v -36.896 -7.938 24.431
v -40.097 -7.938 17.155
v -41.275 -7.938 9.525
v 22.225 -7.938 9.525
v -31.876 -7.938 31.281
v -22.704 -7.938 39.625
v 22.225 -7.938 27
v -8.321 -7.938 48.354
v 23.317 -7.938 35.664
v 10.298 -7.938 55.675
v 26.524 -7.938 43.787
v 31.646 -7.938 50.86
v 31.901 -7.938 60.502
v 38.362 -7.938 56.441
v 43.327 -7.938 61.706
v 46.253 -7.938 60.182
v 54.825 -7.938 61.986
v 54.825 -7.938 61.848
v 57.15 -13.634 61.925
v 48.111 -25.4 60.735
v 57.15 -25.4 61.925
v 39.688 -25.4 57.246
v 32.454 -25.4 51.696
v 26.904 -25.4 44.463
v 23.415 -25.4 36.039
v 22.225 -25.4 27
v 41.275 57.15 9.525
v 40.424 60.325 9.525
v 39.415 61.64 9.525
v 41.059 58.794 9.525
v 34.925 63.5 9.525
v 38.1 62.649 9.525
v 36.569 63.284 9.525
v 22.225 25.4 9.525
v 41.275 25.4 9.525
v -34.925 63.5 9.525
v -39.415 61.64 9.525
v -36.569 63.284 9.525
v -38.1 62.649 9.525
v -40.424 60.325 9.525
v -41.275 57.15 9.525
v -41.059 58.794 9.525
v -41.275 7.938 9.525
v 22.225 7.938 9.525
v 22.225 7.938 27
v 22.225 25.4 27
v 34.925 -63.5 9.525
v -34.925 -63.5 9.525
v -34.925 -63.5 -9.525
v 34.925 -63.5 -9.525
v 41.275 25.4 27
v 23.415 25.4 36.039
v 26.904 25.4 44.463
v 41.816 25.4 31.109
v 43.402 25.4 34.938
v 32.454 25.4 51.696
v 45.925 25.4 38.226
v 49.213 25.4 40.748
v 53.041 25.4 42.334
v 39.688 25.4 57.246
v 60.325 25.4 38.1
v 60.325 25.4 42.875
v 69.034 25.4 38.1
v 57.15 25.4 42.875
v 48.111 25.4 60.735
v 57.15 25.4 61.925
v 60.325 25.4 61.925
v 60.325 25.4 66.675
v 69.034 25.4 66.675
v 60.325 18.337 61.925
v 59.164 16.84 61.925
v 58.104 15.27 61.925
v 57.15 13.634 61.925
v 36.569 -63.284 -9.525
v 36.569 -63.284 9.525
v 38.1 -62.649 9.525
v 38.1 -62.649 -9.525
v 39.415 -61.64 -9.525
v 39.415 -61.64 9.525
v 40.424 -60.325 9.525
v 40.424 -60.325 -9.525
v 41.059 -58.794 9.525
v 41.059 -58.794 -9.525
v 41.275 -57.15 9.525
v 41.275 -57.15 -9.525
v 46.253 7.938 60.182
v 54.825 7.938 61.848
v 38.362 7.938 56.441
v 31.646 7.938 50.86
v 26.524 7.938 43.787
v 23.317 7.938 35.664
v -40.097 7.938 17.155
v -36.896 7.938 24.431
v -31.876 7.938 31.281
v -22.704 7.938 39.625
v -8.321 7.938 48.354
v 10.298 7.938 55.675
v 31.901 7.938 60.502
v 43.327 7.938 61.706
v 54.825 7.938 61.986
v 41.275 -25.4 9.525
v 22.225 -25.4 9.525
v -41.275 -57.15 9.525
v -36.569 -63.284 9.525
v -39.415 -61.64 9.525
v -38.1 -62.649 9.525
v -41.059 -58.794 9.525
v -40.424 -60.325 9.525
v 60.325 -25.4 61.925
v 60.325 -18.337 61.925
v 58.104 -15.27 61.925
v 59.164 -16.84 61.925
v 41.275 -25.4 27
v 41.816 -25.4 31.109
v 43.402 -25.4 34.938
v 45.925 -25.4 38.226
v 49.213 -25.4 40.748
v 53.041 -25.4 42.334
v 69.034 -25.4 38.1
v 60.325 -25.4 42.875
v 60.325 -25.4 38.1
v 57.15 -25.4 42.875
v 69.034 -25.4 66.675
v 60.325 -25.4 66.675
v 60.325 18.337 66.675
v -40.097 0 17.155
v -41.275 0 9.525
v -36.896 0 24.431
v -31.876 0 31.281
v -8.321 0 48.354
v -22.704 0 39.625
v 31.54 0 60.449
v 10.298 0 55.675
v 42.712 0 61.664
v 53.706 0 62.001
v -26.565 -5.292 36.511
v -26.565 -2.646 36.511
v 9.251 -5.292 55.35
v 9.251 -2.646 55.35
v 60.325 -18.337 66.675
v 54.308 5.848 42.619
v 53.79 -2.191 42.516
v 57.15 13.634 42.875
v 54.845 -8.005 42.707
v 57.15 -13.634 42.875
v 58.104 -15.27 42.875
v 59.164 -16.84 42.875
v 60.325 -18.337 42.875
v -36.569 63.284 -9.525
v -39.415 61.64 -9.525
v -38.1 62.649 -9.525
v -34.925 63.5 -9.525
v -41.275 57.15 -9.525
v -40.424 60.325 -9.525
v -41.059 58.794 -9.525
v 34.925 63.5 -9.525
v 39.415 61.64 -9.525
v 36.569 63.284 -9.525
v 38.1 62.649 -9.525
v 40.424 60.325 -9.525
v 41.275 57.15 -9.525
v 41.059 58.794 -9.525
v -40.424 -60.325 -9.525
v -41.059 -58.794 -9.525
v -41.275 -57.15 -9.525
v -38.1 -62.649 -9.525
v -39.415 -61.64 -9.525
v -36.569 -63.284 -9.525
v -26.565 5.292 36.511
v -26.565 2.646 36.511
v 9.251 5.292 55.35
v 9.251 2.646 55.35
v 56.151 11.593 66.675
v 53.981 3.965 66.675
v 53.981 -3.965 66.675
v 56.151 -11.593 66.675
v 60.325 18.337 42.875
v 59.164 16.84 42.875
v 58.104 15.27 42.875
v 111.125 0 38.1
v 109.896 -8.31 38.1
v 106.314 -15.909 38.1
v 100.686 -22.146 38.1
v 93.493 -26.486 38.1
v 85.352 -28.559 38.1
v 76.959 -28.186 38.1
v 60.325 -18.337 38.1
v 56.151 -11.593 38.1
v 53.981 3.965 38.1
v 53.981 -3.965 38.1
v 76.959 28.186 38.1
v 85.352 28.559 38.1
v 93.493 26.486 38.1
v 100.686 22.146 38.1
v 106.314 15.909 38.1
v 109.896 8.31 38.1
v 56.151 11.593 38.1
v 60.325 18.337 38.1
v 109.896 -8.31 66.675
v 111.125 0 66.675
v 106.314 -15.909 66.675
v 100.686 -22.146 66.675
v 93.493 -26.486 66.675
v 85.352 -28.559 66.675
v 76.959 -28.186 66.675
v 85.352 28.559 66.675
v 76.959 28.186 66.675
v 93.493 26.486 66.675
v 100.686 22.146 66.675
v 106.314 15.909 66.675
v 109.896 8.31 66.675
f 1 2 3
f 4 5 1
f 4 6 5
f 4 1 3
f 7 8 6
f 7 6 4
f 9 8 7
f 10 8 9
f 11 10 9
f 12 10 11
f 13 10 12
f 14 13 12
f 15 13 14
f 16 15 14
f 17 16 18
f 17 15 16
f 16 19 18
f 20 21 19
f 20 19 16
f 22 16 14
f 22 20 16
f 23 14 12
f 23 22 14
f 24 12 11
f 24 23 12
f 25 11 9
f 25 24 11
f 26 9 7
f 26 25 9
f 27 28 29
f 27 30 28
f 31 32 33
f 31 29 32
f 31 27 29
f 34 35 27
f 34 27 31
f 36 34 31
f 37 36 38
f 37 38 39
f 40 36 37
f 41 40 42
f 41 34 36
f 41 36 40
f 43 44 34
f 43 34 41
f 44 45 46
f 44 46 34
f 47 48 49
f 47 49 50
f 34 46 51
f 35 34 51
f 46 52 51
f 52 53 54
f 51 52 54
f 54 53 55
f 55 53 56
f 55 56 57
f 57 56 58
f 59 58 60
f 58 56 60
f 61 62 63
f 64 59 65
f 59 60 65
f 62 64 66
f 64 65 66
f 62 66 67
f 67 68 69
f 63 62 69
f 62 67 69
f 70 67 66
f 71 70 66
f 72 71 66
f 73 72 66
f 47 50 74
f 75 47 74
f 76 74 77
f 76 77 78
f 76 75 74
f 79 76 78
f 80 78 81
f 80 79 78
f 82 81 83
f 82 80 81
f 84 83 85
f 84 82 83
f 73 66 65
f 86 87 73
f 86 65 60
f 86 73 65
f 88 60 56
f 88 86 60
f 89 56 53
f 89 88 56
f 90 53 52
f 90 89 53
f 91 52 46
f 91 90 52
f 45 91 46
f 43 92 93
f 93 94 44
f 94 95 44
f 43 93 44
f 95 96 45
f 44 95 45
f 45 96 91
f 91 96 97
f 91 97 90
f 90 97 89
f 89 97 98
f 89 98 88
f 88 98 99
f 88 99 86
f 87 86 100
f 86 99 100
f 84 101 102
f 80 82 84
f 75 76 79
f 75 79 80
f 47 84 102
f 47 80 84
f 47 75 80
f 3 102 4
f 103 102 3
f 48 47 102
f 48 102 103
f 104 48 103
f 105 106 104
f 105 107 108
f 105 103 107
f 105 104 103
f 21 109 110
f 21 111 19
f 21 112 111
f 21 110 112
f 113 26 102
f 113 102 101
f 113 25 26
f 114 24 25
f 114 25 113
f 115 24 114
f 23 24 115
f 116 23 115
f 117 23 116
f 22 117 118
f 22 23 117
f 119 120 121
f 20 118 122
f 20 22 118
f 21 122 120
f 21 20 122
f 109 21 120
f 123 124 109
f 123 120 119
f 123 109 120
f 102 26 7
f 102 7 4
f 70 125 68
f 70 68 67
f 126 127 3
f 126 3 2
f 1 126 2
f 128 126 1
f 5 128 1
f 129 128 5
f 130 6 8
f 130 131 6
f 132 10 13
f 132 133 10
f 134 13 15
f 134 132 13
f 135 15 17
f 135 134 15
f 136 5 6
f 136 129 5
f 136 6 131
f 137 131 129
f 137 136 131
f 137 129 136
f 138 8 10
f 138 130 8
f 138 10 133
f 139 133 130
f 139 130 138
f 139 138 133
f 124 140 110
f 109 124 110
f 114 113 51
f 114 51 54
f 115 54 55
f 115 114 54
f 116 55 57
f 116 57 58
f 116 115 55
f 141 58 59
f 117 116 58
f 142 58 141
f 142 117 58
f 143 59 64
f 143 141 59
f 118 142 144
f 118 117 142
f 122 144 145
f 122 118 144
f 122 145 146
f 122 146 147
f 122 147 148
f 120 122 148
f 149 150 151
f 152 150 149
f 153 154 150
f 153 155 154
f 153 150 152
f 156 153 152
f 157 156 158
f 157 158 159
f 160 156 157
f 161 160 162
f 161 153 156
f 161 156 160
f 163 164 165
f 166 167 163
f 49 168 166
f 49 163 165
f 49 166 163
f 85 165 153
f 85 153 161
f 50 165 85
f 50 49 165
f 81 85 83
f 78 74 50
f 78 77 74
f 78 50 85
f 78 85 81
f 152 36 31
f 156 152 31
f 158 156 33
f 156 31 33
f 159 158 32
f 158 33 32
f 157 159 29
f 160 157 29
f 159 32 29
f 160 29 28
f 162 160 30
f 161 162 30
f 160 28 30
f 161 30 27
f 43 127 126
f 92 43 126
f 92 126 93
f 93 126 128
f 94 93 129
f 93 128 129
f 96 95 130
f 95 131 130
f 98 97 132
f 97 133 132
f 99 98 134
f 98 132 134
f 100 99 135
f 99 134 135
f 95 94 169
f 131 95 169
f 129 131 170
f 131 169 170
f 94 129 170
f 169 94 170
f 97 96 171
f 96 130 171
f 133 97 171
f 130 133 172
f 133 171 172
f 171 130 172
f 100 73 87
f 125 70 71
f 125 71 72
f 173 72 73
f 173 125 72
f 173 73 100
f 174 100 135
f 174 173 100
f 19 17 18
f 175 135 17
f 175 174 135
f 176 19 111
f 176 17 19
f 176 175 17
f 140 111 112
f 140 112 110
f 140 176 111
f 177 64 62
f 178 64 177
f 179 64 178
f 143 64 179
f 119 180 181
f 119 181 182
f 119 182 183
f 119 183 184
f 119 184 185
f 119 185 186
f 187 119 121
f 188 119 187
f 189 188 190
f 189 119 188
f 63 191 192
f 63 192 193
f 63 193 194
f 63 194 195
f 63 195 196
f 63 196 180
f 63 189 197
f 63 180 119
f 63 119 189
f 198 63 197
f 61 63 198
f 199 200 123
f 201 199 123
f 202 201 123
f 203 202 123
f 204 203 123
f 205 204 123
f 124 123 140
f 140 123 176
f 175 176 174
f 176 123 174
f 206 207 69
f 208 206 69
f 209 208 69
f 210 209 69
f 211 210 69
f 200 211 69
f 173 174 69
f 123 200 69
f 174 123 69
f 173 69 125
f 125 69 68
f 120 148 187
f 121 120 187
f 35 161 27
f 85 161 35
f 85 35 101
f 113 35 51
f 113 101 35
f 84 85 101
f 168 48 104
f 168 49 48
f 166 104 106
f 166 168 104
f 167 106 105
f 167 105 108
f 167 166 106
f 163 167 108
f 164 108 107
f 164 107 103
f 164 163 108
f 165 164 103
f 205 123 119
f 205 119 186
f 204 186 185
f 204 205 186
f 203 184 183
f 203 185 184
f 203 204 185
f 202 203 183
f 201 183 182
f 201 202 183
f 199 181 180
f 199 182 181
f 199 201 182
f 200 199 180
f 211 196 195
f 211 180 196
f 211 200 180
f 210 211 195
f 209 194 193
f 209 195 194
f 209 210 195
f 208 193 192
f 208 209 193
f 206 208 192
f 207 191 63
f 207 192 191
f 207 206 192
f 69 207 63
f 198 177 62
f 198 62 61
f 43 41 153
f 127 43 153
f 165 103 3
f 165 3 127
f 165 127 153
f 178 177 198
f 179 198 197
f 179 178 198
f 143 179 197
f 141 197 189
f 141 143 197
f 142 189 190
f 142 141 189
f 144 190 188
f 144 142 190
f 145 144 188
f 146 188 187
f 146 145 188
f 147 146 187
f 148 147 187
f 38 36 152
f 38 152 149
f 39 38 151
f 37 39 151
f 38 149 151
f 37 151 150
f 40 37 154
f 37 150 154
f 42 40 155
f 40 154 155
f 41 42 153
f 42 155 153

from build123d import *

# Parameters (mm, degrees)
F1_DEPTH = 63.5
F2_DEPTH = 25.4
F3_DEPTH = 7.9375
F0_W     = 28.7093819976
F0_H     = 28.575
F5_R     = 6.35


with BuildPart() as f1:
    # F0 (on Front) → F1 (new body, symmetric)
    with BuildSketch(Plane.XZ):
        Polygon((41.275, -9.525), (41.275, 9.525), (22.225, 9.525), (-41.275, 9.525), (-41.275, -9.525), align=None)
    extrude(amount=F1_DEPTH, both=True)

    # F0 (on Front) → F2 (join, symmetric)
    with BuildSketch(Plane.XZ):
        with BuildLine():
            Line((22.225, 9.525), (41.275, 9.525))
            Line((41.275, 9.525), (41.275, 27.0002))
            ThreePointArc((41.275, 27.0002), (45.9246798487, 38.2255201513), (57.15, 42.8752))
            Line((57.15, 42.8752), (60.325, 42.8752))
            Line((60.325, 42.8752), (60.325, 61.9252))
            Line((60.325, 61.9252), (57.15, 61.9252))
            ThreePointArc((57.15, 61.9252), (32.4542956671, 51.6959043329), (22.225, 27.0002))
            Line((22.225, 27.0002), (22.225, 9.525))
        make_face()
        Polygon((60.325, 61.9252), (60.325, 42.8752), (60.325, 38.1), (82.4156180024, 38.1), (82.4156180024, 66.675), (60.325, 66.675), align=None)
    extrude(amount=F2_DEPTH, both=True)

    # F0 (on Front) → F3 (join, symmetric)
    with BuildSketch(Plane.XZ):
        with BuildLine():
            Line((-41.275, 9.525), (22.225, 9.525))
            Line((22.225, 9.525), (22.225, 27.0002))
            ThreePointArc((22.225, 27.0002), (32.4542956671, 51.6959043329), (57.15, 61.9252))
            add(Edge.make_bspline(
                [(-41.275, 9.525), (-40.8948995173, 39.7248640656), (9.798577653, 63.5863382701), (57.15, 61.9252)],
                knots=[0, 0, 0, 0, 111.5045361635, 111.5045361635, 111.5045361635, 111.5045361635], degree=3))
        make_face()
    extrude(amount=F3_DEPTH, both=True)

    # F0 (on Front) → F4 (revolve)
    with BuildSketch(Plane.XZ):
        with Locations((96.7703090012, 52.3875)):
            Rectangle(F0_W, F0_H)
    revolve(axis=Axis((82.4156180024, 0, 52.3875), (0, 0, 1)))

    # F5
    f5_edges = [f1.edges().sort_by_distance(p)[0] for p in [
        (-41.275, -63.5, 0),
        (41.275, -63.5, 0),
        (41.275, 63.5, 0),
        (-41.275, 63.5, 0),
    ]]
    fillet(f5_edges, radius=F5_R)


solid = f1.part
